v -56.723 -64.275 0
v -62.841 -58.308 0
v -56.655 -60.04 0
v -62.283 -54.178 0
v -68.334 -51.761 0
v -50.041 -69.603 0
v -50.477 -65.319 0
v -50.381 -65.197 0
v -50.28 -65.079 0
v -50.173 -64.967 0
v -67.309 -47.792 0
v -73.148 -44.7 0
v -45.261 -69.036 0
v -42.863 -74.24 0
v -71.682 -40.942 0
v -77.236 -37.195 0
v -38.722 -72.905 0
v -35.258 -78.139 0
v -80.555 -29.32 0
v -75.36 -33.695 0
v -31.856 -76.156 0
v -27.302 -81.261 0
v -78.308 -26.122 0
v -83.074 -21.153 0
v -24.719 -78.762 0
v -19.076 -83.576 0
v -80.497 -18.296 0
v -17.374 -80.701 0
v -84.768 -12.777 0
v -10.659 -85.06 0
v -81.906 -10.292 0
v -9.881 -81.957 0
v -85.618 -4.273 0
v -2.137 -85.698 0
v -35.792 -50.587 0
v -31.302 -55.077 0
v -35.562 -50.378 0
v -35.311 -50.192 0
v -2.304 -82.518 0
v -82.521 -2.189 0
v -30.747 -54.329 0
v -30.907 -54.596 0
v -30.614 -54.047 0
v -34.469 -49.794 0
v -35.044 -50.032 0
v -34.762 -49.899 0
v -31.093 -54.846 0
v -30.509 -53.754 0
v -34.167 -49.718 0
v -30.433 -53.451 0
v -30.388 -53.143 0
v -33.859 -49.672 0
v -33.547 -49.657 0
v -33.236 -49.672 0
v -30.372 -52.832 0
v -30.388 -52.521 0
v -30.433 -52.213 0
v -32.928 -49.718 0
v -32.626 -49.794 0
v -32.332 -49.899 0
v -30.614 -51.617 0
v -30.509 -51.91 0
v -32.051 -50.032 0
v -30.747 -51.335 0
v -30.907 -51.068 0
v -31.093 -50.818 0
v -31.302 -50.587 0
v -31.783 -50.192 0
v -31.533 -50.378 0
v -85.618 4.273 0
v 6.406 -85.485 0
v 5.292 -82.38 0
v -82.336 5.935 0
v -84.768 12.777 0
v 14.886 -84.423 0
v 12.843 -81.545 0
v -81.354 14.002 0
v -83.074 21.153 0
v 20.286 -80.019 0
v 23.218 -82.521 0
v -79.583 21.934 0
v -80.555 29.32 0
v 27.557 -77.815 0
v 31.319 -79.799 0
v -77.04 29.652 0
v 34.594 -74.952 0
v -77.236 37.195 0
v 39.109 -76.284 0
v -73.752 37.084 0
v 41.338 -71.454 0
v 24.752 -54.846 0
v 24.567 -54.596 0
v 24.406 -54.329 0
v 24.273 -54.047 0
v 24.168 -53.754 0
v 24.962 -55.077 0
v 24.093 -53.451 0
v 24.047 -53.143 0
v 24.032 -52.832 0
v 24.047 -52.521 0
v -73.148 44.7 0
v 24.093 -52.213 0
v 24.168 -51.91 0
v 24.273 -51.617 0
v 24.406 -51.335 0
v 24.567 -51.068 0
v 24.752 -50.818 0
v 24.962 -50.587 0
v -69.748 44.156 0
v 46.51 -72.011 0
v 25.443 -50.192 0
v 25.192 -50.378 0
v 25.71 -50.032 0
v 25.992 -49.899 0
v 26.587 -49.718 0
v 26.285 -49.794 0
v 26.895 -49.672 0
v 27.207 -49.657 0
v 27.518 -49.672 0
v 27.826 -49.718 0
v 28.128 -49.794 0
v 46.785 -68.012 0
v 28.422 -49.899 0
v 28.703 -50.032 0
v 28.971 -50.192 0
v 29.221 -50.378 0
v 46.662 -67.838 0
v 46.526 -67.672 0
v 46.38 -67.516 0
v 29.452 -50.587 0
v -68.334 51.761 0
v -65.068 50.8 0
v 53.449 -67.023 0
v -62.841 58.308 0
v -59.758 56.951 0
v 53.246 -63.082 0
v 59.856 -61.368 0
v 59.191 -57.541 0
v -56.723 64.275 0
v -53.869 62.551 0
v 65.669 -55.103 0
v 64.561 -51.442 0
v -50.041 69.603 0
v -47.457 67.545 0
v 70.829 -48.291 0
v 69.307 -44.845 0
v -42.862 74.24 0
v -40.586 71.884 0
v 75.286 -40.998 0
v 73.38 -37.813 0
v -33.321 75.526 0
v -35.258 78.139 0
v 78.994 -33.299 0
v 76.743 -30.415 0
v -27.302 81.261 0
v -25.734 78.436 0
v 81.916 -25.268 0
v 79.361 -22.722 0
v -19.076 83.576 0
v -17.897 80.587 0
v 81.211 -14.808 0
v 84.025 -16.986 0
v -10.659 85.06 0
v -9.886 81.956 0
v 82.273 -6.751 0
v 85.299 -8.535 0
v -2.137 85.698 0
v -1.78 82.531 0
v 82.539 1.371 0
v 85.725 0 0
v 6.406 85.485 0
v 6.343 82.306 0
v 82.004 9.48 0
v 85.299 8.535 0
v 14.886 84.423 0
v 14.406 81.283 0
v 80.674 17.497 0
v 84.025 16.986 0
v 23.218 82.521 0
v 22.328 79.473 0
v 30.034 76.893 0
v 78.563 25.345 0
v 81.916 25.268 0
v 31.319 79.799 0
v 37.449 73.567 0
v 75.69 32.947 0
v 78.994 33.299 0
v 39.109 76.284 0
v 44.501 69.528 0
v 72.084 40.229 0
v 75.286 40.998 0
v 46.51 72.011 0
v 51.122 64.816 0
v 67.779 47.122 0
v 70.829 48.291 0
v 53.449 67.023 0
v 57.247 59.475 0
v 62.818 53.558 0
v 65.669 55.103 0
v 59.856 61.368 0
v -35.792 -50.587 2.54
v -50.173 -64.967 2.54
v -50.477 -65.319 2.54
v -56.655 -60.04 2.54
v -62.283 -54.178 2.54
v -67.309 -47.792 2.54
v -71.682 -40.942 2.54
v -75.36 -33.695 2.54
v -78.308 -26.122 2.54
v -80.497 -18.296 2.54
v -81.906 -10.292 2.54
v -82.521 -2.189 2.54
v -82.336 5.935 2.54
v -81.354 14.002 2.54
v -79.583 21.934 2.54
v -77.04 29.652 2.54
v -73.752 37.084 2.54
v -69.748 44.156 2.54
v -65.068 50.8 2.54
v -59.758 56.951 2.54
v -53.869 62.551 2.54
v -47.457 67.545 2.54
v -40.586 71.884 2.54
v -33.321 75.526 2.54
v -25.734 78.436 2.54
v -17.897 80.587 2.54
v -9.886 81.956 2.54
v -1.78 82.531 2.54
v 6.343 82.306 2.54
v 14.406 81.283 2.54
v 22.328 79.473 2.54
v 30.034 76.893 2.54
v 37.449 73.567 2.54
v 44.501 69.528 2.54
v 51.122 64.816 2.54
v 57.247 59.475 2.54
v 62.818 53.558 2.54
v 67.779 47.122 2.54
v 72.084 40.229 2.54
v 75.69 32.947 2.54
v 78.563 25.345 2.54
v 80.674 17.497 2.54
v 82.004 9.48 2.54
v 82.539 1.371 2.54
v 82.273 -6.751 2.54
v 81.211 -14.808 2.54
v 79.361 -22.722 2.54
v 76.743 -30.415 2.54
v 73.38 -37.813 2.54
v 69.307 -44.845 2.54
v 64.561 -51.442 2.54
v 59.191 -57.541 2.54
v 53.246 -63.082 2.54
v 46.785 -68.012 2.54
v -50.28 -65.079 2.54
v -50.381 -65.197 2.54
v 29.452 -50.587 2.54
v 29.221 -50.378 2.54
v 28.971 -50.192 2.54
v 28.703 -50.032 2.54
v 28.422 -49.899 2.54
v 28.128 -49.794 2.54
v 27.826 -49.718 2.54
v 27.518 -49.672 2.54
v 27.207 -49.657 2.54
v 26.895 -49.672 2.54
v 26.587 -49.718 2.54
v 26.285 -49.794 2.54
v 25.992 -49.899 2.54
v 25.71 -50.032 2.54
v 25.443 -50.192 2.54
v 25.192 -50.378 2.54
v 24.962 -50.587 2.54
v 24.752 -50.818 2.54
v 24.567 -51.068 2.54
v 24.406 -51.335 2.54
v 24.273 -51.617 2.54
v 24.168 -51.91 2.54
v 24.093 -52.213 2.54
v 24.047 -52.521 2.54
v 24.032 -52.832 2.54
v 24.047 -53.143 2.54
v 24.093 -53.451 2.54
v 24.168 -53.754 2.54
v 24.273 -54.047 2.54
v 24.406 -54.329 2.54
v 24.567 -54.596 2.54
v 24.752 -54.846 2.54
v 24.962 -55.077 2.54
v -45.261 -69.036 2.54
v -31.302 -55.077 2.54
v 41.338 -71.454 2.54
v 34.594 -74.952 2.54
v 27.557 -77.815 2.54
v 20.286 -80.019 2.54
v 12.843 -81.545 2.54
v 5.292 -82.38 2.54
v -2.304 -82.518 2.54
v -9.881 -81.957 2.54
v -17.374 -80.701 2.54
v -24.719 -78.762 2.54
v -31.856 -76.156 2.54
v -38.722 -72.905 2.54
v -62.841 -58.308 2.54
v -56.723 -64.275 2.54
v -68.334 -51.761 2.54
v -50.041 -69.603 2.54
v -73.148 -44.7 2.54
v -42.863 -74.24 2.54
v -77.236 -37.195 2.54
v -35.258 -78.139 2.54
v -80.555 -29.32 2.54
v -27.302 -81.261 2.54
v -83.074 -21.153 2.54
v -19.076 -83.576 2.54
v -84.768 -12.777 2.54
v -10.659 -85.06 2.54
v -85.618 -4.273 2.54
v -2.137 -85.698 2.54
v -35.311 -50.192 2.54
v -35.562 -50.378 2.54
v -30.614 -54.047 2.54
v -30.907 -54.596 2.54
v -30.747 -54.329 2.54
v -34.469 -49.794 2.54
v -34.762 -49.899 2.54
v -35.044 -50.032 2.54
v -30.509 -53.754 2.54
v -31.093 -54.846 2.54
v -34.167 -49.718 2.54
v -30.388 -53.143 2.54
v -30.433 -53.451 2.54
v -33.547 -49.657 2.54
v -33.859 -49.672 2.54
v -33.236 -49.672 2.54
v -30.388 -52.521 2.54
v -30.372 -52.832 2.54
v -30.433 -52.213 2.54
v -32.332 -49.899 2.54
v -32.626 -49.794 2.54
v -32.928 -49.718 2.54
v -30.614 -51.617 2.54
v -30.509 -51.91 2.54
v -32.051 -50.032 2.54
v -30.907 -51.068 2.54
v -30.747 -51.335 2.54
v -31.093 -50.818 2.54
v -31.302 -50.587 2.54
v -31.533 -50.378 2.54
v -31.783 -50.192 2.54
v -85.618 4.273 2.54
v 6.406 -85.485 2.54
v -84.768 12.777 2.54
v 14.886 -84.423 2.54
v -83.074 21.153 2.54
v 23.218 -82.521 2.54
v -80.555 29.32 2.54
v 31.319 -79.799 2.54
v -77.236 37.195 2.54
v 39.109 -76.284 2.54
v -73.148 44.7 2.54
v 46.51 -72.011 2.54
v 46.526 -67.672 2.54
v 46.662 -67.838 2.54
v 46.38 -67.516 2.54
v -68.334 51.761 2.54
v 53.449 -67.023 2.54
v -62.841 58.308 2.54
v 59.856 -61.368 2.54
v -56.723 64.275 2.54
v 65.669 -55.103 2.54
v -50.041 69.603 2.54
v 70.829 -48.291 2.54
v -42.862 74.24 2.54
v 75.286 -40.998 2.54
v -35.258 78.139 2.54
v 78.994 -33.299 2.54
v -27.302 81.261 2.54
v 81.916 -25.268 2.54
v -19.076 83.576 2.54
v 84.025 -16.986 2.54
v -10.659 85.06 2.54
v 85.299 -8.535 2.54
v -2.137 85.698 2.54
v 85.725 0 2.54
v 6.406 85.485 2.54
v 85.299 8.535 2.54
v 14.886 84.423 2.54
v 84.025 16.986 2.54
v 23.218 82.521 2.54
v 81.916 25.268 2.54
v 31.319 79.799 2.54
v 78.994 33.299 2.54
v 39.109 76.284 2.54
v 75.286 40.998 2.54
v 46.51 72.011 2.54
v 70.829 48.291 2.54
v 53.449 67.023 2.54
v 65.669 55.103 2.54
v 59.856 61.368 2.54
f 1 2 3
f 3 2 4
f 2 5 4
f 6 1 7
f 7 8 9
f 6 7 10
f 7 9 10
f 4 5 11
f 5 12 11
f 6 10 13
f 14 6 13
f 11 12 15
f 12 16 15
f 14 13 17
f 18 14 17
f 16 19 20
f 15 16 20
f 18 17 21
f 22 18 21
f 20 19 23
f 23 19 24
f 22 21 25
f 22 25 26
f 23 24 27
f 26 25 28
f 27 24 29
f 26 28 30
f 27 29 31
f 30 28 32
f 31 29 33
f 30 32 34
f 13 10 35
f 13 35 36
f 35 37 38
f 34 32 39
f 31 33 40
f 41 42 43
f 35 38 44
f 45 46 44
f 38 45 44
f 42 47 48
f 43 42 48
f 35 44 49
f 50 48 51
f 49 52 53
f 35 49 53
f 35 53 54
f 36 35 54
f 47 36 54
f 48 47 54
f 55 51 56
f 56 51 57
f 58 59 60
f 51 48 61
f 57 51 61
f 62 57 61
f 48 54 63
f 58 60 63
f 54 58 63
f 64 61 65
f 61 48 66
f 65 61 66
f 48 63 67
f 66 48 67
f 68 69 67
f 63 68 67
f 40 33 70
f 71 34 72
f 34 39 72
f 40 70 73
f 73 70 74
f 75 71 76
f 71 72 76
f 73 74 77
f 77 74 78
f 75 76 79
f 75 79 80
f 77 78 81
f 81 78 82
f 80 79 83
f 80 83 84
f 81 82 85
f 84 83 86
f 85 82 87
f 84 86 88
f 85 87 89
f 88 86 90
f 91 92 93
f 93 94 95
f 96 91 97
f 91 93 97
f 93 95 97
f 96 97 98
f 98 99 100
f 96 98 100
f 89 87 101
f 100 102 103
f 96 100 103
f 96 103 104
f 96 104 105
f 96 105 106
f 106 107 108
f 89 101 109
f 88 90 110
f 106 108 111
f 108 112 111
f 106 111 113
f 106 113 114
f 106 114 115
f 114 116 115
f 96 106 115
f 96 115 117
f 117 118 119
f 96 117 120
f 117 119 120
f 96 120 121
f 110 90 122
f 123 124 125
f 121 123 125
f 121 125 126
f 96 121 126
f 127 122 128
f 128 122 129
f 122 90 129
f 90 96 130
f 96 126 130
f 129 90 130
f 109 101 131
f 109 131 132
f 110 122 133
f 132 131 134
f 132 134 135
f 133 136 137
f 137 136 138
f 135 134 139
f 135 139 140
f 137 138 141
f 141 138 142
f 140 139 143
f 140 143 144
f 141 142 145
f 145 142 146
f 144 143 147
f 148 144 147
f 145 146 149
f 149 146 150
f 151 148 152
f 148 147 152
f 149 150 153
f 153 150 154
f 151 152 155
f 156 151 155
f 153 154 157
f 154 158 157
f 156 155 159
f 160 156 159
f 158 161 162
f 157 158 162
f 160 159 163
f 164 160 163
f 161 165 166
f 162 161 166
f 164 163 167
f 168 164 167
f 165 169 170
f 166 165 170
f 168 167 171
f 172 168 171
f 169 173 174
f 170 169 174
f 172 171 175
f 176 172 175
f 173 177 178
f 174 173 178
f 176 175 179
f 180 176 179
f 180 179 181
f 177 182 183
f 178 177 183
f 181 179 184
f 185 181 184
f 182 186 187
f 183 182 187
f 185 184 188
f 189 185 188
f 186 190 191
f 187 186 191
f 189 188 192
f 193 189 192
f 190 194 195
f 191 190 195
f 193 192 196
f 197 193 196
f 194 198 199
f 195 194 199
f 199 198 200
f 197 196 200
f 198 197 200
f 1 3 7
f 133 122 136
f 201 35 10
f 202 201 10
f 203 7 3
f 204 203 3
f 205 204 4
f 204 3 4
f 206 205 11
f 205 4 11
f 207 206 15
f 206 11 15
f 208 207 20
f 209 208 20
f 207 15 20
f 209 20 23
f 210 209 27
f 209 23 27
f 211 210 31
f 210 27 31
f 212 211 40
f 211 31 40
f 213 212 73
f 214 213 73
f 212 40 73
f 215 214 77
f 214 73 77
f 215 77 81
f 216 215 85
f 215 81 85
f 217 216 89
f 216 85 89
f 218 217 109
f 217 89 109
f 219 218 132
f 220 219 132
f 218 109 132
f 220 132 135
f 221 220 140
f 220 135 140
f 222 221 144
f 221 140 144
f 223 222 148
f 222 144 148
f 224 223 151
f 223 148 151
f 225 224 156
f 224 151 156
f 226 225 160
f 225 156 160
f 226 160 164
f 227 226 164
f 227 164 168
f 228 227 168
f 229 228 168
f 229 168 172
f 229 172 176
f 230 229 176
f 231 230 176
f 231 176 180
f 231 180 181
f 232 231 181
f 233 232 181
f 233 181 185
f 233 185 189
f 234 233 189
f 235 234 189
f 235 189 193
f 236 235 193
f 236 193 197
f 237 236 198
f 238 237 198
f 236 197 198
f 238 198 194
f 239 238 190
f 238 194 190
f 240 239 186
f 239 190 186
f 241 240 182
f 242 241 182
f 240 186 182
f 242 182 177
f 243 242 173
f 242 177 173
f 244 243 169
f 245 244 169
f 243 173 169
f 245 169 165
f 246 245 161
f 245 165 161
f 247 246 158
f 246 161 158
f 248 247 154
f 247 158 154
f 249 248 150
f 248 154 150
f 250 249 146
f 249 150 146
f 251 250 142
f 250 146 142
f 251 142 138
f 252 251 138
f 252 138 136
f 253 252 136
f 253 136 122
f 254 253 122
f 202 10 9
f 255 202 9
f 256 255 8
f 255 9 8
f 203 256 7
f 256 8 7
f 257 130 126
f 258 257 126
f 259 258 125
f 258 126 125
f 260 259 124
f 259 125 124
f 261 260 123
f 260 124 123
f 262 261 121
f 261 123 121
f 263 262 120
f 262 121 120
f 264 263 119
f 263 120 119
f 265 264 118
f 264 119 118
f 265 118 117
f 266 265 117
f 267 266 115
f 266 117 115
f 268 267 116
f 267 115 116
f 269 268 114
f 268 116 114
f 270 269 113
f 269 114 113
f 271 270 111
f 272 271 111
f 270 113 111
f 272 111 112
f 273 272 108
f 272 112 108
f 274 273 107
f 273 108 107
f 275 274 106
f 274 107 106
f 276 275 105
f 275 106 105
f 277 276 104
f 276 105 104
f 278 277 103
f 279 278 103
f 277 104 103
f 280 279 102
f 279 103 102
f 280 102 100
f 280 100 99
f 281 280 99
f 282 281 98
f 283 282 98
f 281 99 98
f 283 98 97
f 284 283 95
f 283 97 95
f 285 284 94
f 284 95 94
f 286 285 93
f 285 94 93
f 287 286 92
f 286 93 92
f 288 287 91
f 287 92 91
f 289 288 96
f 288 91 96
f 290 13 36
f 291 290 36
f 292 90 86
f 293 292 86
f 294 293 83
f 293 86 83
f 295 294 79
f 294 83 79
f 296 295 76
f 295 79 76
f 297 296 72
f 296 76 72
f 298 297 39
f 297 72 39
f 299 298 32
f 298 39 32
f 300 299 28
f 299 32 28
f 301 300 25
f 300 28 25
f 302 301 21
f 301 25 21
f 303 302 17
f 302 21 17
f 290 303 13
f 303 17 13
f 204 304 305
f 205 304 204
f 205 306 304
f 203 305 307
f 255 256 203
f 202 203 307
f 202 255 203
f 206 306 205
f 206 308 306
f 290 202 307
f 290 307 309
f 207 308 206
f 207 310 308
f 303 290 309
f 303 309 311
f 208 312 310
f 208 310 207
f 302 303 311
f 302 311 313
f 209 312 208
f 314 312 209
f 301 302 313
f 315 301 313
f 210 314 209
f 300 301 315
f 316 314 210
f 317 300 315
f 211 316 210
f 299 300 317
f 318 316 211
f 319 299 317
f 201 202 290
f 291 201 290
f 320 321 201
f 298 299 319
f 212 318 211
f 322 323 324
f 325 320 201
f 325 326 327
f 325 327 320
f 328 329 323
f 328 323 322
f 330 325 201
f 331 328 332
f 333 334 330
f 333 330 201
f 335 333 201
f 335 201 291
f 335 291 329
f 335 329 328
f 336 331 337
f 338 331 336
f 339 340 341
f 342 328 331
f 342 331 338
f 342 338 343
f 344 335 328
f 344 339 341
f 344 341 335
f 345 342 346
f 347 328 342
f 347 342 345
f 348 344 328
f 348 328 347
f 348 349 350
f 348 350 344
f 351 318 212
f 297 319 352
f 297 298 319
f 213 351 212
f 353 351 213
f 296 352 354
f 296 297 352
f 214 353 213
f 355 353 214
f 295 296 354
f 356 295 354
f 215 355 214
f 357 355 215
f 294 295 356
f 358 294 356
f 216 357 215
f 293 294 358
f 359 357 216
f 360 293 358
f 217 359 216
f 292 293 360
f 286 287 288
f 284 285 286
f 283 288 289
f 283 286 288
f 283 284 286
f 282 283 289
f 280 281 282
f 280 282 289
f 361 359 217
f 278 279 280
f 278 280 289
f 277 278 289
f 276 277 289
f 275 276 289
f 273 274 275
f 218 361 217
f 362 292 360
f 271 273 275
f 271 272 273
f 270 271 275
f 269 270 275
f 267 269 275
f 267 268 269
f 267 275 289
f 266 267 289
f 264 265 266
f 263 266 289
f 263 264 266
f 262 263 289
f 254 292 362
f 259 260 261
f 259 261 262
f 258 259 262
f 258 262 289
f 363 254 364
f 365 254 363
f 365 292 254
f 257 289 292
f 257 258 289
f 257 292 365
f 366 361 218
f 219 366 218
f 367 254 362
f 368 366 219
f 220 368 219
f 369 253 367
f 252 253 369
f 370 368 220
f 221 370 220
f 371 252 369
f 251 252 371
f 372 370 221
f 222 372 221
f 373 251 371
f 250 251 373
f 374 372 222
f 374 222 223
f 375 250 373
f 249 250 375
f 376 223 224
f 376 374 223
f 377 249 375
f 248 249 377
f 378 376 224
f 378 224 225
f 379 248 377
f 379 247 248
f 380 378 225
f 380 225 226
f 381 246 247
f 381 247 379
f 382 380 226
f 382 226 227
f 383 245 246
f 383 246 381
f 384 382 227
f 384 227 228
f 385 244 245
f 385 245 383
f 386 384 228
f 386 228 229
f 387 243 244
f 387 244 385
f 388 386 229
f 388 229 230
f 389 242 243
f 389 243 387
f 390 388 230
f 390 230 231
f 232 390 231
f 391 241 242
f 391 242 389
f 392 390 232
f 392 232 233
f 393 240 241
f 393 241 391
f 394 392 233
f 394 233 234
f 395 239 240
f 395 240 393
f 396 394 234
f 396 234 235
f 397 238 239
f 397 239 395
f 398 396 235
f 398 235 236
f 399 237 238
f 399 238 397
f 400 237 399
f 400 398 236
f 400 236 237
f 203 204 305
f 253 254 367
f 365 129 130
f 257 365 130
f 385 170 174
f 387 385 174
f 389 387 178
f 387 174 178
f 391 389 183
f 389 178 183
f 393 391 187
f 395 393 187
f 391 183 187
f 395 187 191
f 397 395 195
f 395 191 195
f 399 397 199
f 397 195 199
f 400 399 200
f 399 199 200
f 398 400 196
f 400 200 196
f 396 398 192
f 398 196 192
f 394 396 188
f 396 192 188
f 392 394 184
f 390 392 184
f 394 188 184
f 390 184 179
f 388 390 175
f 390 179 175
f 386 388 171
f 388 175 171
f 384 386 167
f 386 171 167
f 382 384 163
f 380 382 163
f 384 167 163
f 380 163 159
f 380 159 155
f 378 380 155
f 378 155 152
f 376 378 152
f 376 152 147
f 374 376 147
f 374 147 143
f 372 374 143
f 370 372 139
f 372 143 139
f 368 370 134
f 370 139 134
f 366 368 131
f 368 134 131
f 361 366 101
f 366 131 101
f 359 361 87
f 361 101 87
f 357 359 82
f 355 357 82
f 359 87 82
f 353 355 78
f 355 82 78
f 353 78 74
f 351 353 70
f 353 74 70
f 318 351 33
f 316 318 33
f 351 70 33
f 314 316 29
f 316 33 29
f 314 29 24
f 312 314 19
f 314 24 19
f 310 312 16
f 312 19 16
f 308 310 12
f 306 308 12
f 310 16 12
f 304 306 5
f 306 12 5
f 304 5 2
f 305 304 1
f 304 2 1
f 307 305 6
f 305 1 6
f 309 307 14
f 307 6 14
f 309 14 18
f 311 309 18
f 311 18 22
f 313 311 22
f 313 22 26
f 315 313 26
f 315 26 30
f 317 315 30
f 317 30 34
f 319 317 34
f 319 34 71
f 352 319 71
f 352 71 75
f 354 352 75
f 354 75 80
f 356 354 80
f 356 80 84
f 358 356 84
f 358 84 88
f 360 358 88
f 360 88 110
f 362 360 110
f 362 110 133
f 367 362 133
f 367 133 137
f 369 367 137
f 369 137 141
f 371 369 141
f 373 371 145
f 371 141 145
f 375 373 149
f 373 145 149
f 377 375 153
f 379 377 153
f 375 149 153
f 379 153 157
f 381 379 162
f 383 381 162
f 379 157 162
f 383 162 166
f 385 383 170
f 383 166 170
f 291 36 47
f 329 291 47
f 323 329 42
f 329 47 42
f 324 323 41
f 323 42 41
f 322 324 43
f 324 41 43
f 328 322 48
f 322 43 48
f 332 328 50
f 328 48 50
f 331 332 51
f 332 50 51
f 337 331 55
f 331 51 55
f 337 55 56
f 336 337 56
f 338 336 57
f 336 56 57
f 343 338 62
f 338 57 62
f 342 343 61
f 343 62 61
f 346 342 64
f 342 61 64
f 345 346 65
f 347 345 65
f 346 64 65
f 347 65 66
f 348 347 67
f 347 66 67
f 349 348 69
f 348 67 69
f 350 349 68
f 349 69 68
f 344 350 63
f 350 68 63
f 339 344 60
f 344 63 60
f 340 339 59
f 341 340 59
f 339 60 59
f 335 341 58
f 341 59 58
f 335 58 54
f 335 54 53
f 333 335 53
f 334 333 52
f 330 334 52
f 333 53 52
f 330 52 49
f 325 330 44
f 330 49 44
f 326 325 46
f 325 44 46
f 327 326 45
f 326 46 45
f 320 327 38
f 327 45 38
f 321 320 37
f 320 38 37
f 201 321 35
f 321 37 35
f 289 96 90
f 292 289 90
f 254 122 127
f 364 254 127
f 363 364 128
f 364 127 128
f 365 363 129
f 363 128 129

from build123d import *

# Parameters (mm, degrees)
SKETCH1_R           = 85.725
BOSS_EXTRUDE2_DEPTH = 2.54


with BuildPart() as part:
    # Sketch1 → Boss-Extrude2 (new body)
    with BuildSketch(Plane.XY):
        Circle(SKETCH1_R)
        with BuildLine():
            ThreePointArc((-50.476604824, -65.319329952), (2.284509609, 82.518382896), (46.785345693, -68.012013118))
            ThreePointArc((46.785345693, -68.012013118), (46.595439838, -67.75364435), (46.380442263, -67.515747951))
            Line((46.380442263, -67.515747951), (29.451630282, -50.58693597))
            ThreePointArc((29.451630282, -50.58693597), (24.961502222, -50.58693597), (24.961502222, -55.07706403))
            Line((24.961502222, -55.07706403), (41.33826935, -71.453831158))
            ThreePointArc((41.33826935, -71.453831158), (-2.304078902, -82.517838801), (-45.26104742, -69.035788447))
            Line((-45.26104742, -69.035788447), (-31.302323003, -55.07706403))
            ThreePointArc((-31.302323003, -55.07706403), (-31.302323003, -50.58693597), (-35.792451064, -50.58693597))
            Line((-35.792451064, -50.58693597), (-50.172516759, -64.967001665))
            ThreePointArc((-50.172516759, -64.967001665), (-50.331025251, -65.137586452), (-50.476604824, -65.319329952))
        make_face(mode=Mode.SUBTRACT)
    extrude(amount=BOSS_EXTRUDE2_DEPTH)


solid = part.part
